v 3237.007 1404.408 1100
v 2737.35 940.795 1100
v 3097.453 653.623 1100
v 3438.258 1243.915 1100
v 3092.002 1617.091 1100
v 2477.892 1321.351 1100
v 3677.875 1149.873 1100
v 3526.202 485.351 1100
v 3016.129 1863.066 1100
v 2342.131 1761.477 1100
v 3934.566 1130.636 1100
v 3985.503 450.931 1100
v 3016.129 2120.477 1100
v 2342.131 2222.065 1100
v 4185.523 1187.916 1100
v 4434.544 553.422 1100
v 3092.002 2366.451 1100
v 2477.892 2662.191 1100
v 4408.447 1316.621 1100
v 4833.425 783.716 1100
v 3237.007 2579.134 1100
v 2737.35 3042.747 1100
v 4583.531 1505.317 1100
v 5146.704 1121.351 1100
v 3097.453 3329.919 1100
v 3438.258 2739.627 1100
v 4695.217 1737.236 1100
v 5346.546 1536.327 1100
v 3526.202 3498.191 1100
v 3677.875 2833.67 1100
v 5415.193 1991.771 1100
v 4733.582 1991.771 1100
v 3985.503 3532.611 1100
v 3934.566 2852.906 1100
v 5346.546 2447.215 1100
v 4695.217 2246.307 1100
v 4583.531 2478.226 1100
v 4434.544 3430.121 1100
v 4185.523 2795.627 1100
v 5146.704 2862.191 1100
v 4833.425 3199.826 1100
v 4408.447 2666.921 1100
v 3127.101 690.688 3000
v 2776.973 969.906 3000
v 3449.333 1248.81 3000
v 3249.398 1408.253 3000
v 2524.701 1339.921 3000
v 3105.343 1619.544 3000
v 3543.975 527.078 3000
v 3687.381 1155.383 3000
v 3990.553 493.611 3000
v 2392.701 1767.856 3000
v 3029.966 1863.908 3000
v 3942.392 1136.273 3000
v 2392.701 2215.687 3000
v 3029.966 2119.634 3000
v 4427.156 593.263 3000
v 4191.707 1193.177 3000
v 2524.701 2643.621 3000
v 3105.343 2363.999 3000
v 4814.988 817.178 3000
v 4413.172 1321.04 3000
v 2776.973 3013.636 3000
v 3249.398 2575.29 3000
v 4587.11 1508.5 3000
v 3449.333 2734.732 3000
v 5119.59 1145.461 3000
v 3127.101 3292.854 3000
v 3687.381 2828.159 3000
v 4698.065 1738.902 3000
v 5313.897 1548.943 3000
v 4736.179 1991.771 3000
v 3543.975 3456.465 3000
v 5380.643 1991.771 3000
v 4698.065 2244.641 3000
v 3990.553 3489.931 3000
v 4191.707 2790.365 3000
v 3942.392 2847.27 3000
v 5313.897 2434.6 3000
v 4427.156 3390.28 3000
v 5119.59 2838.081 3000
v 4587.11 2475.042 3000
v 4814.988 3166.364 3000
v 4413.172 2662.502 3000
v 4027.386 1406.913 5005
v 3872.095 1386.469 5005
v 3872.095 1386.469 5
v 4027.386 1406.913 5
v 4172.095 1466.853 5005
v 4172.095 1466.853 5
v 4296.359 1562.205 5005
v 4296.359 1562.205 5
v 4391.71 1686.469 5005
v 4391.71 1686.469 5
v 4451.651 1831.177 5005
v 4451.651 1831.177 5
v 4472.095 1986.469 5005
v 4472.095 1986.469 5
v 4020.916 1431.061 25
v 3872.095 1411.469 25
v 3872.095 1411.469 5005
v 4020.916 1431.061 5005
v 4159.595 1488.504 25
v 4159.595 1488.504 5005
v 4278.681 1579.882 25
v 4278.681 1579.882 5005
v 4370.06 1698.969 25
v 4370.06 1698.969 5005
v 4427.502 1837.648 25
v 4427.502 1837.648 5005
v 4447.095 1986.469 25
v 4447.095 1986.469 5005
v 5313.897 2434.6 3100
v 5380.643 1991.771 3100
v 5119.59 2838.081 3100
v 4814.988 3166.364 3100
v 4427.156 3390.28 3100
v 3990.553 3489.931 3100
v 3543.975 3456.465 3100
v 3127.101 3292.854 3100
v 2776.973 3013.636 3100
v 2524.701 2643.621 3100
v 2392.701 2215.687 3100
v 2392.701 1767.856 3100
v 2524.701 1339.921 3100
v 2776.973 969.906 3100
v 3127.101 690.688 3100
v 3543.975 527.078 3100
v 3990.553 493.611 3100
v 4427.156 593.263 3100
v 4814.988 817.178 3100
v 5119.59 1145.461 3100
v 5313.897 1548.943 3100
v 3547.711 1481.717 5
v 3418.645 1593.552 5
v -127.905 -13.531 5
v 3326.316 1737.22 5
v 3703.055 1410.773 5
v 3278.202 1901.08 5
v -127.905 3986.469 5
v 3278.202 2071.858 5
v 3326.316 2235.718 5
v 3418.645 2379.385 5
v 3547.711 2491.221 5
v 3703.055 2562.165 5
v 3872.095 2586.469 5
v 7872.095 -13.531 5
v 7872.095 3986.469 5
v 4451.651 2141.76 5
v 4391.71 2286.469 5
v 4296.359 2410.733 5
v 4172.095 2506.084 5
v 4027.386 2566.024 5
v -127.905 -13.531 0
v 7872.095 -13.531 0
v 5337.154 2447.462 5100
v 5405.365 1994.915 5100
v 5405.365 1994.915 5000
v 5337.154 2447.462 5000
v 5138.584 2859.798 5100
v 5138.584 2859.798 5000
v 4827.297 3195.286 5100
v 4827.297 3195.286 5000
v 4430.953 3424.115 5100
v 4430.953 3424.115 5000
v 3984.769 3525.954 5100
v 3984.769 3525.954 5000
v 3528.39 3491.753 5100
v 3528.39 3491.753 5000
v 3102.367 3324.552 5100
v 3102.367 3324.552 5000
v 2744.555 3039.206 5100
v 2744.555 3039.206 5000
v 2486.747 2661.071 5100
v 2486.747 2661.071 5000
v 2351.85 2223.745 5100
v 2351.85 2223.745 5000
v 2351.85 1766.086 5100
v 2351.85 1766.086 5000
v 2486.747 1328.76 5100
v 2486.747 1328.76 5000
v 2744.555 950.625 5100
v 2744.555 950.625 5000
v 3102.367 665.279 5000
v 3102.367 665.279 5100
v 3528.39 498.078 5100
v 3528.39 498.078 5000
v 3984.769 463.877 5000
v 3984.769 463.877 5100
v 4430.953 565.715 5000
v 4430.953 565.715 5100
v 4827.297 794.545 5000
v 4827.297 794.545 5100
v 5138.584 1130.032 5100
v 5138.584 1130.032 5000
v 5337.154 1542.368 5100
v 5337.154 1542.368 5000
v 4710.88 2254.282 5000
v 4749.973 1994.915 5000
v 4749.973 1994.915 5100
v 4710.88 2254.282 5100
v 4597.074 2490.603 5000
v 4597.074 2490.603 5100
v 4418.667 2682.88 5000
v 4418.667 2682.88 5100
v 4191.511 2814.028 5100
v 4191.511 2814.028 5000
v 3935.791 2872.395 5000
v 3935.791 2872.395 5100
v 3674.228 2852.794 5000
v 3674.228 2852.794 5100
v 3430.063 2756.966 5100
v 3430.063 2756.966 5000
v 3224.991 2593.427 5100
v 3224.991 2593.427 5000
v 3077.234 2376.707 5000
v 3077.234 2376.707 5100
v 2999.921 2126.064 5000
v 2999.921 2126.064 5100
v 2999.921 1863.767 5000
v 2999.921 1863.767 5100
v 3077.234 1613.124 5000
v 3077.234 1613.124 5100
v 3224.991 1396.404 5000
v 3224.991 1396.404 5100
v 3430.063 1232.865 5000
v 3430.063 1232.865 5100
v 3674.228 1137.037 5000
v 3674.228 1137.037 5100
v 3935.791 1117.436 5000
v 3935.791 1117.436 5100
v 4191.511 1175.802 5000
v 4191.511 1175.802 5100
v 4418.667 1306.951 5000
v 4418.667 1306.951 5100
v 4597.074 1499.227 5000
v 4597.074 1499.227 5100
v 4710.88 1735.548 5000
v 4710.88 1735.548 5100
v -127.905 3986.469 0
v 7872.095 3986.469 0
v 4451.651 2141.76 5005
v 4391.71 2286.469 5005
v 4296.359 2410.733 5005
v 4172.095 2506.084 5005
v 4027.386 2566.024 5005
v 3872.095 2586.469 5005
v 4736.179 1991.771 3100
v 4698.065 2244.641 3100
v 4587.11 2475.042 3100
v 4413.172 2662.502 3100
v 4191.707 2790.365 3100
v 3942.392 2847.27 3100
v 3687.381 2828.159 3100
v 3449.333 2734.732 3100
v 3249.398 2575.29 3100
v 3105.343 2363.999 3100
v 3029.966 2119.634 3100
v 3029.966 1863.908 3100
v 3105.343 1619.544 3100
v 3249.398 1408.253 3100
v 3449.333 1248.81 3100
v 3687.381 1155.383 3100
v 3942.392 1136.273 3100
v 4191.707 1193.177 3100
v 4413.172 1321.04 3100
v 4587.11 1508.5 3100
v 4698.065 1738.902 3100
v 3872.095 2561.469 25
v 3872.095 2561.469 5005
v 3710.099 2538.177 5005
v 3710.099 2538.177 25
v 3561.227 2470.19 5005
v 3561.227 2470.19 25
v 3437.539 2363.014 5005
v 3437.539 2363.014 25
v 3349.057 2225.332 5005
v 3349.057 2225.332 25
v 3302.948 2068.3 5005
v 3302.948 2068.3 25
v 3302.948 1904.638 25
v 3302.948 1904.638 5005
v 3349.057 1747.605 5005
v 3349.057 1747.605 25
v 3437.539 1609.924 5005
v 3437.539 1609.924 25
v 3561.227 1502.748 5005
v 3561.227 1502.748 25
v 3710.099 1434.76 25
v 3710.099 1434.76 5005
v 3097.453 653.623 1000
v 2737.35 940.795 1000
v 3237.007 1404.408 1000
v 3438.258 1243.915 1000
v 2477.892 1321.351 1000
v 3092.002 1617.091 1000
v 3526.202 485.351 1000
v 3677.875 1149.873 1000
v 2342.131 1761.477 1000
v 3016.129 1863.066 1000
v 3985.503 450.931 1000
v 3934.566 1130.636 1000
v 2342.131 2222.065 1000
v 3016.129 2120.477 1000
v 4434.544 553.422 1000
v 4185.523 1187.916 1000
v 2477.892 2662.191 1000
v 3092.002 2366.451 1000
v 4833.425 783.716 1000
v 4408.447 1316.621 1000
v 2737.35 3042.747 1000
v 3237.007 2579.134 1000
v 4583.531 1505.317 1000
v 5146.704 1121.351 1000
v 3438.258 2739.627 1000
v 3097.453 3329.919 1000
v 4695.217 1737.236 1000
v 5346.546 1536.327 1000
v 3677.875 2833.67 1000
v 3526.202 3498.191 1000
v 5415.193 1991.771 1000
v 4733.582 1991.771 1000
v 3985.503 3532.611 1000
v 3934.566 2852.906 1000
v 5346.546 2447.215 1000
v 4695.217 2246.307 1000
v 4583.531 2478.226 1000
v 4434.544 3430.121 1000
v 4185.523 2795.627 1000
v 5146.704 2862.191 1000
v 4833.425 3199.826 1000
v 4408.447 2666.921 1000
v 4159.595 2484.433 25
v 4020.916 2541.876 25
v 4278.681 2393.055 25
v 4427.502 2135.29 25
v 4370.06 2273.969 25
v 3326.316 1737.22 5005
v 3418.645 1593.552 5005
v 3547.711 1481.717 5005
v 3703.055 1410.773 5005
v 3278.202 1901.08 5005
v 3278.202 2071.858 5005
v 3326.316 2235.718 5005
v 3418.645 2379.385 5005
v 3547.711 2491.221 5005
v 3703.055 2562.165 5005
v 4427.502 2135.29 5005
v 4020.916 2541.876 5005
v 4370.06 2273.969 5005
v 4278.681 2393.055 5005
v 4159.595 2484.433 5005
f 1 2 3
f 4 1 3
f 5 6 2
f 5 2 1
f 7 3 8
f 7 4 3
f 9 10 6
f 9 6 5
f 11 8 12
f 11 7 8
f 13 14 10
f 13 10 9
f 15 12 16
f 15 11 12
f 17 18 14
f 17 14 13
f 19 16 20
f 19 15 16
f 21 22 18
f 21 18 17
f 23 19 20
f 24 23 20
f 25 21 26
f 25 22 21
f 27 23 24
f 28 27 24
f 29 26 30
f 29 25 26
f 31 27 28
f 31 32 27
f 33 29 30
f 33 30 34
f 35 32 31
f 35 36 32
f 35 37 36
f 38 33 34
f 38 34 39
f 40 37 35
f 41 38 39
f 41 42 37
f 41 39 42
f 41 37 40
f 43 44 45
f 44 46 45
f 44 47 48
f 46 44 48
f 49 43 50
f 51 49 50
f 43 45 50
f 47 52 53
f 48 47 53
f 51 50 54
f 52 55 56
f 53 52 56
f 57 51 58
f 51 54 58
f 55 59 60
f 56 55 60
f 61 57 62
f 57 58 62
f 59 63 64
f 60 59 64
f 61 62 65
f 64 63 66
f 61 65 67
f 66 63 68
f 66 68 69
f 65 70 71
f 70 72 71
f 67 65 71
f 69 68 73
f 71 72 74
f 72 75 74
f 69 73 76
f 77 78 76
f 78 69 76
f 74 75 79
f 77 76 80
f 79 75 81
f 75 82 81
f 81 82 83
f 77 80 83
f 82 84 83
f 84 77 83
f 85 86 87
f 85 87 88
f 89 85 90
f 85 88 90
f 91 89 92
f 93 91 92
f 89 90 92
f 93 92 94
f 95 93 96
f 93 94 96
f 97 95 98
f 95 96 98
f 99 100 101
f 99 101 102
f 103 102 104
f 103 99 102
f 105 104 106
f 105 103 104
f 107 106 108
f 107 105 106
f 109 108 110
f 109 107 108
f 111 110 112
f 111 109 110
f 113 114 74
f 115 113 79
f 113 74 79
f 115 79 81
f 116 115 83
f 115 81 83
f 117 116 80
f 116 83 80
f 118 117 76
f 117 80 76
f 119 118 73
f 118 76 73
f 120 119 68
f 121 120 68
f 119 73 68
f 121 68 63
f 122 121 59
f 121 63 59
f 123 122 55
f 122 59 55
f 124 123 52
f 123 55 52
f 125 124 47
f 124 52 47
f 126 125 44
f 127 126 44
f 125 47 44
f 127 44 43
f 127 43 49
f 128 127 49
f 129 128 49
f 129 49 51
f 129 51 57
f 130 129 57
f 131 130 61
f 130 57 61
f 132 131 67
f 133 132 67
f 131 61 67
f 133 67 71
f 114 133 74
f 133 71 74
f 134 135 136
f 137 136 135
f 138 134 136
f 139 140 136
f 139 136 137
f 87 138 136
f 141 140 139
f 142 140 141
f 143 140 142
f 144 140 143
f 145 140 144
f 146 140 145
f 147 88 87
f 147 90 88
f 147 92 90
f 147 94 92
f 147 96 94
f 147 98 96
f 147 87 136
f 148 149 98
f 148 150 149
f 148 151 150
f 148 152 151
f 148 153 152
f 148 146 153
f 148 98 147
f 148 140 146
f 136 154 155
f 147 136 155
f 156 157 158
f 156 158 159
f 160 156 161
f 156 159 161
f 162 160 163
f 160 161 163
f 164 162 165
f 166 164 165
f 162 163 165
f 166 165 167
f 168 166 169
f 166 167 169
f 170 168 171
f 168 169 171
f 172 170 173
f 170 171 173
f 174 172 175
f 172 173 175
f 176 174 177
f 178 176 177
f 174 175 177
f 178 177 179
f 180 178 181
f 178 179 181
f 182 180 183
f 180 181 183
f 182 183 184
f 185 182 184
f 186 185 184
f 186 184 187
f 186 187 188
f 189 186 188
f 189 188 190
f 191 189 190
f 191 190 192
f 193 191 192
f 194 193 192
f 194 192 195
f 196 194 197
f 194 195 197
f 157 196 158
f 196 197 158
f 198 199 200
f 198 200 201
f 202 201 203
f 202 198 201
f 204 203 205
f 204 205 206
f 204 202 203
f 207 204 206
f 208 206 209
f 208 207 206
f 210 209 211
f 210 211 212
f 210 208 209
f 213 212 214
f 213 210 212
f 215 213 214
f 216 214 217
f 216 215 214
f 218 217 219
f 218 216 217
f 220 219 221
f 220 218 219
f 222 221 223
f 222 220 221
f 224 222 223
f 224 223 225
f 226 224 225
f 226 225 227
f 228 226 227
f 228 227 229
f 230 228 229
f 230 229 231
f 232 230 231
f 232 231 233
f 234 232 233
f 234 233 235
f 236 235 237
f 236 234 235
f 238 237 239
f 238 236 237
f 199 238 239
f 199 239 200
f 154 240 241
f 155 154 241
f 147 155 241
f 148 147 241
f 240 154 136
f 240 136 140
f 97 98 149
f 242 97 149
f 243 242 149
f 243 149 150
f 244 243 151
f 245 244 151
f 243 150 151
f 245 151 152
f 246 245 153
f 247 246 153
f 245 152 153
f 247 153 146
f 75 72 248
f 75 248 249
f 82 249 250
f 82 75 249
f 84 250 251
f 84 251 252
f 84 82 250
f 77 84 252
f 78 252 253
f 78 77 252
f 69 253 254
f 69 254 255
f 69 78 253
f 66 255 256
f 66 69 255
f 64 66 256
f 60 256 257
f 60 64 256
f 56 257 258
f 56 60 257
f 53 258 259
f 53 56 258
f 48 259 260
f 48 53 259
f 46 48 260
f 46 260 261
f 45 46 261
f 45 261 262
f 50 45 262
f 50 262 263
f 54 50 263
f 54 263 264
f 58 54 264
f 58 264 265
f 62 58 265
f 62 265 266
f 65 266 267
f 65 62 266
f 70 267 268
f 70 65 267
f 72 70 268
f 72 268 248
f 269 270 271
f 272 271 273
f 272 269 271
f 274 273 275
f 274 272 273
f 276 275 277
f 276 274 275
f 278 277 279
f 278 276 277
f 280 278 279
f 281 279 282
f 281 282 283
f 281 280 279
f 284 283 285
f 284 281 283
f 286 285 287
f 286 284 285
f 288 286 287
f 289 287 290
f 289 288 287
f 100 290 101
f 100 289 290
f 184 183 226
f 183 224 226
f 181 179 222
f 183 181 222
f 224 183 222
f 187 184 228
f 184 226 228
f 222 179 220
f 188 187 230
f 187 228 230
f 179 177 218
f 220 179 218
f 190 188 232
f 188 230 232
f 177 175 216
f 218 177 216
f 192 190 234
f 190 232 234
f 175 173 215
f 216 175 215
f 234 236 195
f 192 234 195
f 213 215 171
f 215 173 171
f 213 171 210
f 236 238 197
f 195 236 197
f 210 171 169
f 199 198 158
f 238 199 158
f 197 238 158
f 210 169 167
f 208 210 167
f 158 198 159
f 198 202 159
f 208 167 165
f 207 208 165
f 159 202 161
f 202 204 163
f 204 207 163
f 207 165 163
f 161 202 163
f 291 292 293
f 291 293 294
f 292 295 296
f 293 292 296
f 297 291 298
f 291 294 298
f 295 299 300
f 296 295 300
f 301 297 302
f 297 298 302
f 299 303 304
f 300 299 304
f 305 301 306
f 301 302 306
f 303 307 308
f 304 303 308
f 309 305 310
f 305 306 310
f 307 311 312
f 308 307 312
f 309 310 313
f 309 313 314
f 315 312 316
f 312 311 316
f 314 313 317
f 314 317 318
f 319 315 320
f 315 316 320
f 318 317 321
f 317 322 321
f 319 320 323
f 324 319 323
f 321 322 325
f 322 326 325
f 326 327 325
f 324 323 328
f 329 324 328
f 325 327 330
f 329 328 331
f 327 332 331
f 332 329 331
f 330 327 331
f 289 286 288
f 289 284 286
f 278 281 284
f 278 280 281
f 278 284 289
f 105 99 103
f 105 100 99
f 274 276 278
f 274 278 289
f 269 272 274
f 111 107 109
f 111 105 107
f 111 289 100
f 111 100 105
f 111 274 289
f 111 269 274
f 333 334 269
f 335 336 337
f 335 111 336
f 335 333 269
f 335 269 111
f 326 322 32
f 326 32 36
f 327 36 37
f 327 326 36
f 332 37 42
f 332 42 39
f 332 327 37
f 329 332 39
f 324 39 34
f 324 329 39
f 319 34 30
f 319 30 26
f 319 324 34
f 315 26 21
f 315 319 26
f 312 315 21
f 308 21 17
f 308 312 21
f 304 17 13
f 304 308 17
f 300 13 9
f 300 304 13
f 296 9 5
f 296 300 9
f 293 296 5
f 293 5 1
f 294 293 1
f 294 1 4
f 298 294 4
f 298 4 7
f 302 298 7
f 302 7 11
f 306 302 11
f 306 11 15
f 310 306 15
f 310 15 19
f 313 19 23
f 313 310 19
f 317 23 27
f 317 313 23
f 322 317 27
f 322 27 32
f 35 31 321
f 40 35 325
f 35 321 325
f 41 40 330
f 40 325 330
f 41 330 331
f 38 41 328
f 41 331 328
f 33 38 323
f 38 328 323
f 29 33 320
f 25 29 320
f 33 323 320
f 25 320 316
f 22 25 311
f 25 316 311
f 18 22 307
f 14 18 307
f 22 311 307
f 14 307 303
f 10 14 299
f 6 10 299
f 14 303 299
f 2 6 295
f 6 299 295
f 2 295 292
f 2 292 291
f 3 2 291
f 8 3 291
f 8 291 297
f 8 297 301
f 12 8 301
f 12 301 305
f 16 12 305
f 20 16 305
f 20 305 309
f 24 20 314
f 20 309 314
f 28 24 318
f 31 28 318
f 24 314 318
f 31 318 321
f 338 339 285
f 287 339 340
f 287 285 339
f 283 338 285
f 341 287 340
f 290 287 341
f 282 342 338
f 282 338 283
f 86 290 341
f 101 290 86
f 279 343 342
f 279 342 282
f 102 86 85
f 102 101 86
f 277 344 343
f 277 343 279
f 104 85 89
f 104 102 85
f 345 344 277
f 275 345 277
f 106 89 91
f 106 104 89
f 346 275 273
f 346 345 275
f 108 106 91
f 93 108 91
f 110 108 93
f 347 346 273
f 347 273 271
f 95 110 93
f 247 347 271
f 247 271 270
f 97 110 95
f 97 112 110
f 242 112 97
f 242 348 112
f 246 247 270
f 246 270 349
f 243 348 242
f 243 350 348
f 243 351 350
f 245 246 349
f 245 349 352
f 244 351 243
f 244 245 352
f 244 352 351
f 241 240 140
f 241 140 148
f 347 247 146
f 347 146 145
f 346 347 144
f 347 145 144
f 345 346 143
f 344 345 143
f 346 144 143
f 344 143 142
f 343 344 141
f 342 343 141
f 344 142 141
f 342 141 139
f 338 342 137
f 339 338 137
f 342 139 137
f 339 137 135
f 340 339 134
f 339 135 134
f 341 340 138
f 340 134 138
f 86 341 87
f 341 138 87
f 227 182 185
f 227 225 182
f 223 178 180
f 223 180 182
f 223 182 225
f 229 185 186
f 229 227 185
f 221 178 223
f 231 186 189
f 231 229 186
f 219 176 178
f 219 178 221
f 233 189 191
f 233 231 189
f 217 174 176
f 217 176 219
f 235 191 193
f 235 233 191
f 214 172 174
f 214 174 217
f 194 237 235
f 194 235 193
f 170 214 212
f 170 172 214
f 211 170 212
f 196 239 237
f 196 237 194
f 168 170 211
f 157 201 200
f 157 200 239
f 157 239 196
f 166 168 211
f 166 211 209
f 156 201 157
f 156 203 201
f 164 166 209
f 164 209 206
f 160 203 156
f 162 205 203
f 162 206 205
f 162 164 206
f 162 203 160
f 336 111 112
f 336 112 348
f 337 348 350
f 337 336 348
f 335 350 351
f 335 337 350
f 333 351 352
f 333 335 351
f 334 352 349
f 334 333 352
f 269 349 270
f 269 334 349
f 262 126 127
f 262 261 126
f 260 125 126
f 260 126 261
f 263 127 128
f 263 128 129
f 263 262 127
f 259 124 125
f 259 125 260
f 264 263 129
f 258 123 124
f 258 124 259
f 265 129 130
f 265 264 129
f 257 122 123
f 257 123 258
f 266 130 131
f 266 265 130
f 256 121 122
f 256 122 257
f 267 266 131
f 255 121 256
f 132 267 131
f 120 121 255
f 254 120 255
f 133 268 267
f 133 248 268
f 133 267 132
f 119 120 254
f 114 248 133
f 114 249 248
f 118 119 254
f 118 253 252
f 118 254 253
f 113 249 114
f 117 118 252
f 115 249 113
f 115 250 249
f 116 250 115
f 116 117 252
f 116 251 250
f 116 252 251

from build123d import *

# Parameters (mm, degrees)
F0_W      = 8000
F0_H      = 4000
F1_DEPTH  = 5
F3_DEPTH  = 5000
F4_T      = -25
F8_R      = 1535.331616
F8_R_2    = 879.940091
F9_DEPTH  = 100
F10_R     = 1502.360966
F10_R_2   = 857.89736
F11_DEPTH = 100
F12_R     = 1545.16043
F12_R_2   = 863.549407
F13_DEPTH = 100


with BuildPart() as f1:
    # F0 (on Top) → F1 (new body)
    with BuildSketch(Plane.XY):
        with Locations((3872.095021, 1986.468735)):
            Rectangle(F0_W, F0_H)
    extrude(amount=F1_DEPTH)

    # F2 (on face) → F3 (join)
    with BuildSketch(Plane.XY.offset(5)):
        with BuildLine():
            ThreePointArc((3872.095021, 1386.468735), (4296.35909, 1562.204666), (4472.095021, 1986.468735))
            ThreePointArc((4472.095021, 1986.468735), (4296.35909, 2410.732804), (3872.095021, 2586.468735))
            Line((3872.095021, 2586.468735), (3872.095021, 1386.468735))
        make_face()
        with BuildLine():
            Line((3872.095021, 1386.468735), (3872.095021, 2586.468735))
            ThreePointArc((3872.095021, 2586.468735), (3272.095021, 1986.468735), (3872.095021, 1386.468735))
        make_face()
    extrude(amount=F3_DEPTH)

    # F4
    f4_openings = [f1.faces().sort_by_distance(p)[0] for p in [
        (3872.095021, 1986.468735, 5005),
    ]]
    offset(amount=F4_T, openings=f4_openings)


with BuildPart() as f9:
    # F8 (on offset) → F9 (new body)
    with BuildSketch(Plane.XY.offset(5000)):
        with Locations((3870.033026, 1994.915366)):
            Circle(F8_R)
        with Locations((3870.033026, 1994.915366)):
            Circle(F8_R_2, mode=Mode.SUBTRACT)
    extrude(amount=F9_DEPTH)


with BuildPart() as f11:
    # F10 (on offset) → F11 (new body)
    with BuildSketch(Plane.XY.offset(3000)):
        with Locations((3878.281593, 1991.771221)):
            Circle(F10_R)
        with Locations((3878.281593, 1991.771221)):
            Circle(F10_R_2, mode=Mode.SUBTRACT)
    extrude(amount=F11_DEPTH)


with BuildPart() as f13:
    # F12 (on offset) → F13 (new body)
    with BuildSketch(Plane.XY.offset(1000)):
        with Locations((3870.033026, 1991.771221)):
            Circle(F12_R)
        with Locations((3870.033026, 1991.771221)):
            Circle(F12_R_2, mode=Mode.SUBTRACT)
    extrude(amount=F13_DEPTH)


solid = Compound([f1.part, f9.part, f11.part, f13.part])
